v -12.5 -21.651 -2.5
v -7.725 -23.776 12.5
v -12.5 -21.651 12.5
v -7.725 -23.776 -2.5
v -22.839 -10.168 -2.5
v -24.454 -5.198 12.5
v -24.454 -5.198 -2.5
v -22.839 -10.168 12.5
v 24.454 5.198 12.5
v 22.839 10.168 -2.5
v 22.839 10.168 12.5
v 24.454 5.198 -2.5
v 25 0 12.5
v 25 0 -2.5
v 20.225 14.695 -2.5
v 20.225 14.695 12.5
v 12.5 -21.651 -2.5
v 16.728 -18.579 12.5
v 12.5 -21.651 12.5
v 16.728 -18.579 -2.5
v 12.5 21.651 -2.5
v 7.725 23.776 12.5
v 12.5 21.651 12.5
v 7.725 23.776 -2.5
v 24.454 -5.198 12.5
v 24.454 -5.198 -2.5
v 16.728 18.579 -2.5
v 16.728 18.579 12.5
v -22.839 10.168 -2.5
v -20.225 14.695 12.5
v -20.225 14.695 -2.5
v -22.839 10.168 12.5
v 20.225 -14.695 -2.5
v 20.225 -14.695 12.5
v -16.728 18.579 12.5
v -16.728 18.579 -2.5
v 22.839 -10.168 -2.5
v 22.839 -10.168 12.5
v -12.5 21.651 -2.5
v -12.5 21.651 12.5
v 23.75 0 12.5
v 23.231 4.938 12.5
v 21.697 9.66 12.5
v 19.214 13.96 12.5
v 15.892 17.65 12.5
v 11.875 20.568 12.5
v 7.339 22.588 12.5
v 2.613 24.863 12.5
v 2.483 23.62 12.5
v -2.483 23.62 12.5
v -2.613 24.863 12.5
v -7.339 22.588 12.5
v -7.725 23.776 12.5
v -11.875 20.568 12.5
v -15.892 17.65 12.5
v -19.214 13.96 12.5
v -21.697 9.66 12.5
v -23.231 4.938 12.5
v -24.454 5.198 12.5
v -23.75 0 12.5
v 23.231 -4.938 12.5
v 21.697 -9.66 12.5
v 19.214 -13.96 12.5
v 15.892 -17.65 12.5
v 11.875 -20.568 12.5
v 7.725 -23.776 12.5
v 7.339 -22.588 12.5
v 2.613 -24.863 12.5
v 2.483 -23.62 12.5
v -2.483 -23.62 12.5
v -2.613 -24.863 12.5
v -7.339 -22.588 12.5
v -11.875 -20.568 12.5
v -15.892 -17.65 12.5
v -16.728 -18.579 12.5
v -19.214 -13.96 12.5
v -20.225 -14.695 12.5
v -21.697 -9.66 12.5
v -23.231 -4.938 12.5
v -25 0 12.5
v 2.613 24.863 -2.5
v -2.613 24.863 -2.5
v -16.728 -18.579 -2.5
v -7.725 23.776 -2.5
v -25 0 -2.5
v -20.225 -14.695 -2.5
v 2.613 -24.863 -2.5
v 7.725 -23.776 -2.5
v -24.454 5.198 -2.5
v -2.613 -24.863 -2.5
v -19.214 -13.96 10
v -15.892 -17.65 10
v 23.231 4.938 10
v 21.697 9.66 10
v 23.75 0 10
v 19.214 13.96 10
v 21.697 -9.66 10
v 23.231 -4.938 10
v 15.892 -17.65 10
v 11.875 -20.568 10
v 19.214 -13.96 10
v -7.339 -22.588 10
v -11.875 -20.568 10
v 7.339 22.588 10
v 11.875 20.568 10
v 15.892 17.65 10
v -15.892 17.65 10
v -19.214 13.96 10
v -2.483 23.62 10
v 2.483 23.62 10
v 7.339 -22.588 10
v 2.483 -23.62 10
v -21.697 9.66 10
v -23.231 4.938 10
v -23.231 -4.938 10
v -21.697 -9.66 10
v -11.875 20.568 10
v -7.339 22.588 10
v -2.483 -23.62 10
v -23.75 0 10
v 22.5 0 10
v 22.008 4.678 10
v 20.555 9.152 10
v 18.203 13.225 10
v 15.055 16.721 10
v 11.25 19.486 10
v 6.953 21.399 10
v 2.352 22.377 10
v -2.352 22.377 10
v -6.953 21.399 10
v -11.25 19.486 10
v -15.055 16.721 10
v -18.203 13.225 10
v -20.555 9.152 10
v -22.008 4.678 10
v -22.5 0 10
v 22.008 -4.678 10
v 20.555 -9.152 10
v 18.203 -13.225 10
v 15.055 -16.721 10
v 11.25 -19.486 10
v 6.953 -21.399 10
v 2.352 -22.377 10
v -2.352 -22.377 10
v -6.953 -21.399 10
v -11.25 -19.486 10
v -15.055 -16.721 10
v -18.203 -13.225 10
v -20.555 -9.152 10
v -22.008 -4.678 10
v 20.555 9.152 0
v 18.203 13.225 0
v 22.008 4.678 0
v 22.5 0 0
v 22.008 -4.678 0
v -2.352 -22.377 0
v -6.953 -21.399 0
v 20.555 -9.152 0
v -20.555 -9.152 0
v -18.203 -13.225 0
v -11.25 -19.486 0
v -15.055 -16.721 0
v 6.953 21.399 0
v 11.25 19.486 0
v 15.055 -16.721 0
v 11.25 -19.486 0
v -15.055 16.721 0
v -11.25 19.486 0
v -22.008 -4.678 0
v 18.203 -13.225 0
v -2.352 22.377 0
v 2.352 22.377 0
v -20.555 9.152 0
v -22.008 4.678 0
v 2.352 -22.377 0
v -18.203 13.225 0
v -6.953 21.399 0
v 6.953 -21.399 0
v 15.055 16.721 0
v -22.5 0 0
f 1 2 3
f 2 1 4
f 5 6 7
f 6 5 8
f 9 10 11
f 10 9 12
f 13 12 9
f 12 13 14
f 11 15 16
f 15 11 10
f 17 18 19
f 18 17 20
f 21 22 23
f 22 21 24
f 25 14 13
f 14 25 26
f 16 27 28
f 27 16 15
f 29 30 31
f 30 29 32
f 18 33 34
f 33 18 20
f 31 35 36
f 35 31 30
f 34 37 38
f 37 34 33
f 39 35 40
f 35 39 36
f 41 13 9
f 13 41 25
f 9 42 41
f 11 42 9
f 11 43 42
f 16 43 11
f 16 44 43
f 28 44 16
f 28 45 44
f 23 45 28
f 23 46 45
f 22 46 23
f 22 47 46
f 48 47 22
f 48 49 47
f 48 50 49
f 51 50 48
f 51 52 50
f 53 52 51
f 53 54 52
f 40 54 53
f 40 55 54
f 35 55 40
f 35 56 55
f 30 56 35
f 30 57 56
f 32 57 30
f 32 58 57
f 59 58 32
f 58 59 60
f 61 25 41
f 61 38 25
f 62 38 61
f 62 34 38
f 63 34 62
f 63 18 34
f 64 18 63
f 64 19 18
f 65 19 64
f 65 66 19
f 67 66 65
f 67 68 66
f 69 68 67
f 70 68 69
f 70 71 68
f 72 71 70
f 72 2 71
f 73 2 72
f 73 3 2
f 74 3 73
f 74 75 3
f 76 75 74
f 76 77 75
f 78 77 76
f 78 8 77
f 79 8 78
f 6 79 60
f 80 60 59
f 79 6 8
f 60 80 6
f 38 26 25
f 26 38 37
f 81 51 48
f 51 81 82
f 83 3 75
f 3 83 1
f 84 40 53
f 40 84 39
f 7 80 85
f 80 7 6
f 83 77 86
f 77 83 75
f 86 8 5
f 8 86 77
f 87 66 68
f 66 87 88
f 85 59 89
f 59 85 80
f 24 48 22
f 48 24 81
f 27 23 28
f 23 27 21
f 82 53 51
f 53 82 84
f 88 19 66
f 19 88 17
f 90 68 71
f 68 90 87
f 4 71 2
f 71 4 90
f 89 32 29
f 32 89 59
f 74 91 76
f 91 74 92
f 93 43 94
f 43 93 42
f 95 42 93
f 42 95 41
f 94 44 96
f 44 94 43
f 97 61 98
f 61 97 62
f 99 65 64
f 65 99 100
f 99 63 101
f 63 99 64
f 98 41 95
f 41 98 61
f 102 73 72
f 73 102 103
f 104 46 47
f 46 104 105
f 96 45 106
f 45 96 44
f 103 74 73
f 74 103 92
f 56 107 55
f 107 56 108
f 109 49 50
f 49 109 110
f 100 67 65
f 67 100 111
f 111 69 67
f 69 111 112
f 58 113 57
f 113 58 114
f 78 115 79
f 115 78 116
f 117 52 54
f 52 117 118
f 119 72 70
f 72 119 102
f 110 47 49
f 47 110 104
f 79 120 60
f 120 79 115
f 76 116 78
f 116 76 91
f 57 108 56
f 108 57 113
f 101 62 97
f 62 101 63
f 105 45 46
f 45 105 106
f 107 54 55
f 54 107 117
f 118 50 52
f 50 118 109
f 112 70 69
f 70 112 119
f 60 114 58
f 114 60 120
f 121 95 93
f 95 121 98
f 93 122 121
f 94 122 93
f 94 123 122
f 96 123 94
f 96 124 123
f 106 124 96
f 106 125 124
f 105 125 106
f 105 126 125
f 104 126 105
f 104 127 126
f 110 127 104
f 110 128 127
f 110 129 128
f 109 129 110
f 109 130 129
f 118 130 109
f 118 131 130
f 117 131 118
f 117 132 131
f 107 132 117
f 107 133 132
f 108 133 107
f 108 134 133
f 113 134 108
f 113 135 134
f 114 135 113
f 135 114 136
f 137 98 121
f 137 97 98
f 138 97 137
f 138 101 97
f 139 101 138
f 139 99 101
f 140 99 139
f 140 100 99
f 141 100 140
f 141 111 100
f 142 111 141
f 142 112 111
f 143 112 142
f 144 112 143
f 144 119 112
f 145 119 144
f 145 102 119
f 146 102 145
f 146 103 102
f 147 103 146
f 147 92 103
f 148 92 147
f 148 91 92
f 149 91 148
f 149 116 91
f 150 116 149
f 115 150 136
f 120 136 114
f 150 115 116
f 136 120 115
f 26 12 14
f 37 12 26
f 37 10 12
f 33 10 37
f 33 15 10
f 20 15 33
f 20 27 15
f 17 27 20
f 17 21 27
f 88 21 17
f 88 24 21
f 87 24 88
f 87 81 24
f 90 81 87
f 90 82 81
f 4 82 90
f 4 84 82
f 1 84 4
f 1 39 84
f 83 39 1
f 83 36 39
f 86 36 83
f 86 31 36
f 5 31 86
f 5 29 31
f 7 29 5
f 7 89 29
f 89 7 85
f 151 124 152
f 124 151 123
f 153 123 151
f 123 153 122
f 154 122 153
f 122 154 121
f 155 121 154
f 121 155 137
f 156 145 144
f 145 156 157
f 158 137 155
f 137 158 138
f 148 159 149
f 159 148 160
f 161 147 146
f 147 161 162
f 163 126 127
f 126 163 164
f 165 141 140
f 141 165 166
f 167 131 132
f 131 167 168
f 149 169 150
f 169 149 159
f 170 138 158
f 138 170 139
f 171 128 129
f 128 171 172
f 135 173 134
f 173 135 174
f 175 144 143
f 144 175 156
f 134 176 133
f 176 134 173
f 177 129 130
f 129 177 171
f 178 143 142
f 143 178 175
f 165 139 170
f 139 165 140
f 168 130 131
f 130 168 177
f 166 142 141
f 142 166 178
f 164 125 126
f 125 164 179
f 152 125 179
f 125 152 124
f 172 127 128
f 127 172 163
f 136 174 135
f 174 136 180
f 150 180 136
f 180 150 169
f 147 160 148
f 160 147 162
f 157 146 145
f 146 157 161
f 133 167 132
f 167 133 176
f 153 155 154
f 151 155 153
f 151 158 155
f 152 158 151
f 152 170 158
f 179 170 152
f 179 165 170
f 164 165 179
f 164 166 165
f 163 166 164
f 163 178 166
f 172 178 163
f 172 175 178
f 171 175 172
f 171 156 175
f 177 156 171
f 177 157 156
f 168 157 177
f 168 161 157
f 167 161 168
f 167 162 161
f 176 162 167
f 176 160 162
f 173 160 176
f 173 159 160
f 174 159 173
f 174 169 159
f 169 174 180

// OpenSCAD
height_picture = 3; // [1:5]
  
Cylinder_radius= 50+0;

Cup_Radius=22.5;//in mm

Top_Minimum_Thickness=2.5;
Wall_Thickness=2.5;
Wall_Height=10;
Rc=Cup_Radius+Wall_Thickness;
Base_Incut=1.25;
Base_Thickness=2.5;
Base_Radius=Cup_Radius+Base_Incut;


// Load a 100x100 pixel image. (images will be automatically stretched to fit) Simple, high contrast images like logos work best.
image_file = "image-surface.dat"; // [image_surface:100x100] 
 
union (){

difference(){
cylinder(Wall_Height+Base_Thickness,Rc,Rc);
translate([0,0,-1])cylinder(Wall_Height+2+Base_Thickness,Base_Radius,Base_Radius);
}

difference(){
translate([0,0,-Top_Minimum_Thickness])cylinder(Wall_Height+Top_Minimum_Thickness,Rc,Rc);
translate([0,0,-1-Top_Minimum_Thickness])cylinder(Wall_Height+2+Top_Minimum_Thickness,Cup_Radius,Cup_Radius);
}

translate([0,0,0-Top_Minimum_Thickness])cylinder(Top_Minimum_Thickness,Rc,Rc);

scale([Cup_Radius/50,Cup_Radius/50,1]) intersection(){
translate([0,0,0-Top_Minimum_Thickness])cylinder(height_picture+Top_Minimum_Thickness+1,Cylinder_radius,Cylinder_radius);

scale([1,1,height_picture]) surface(file=image_file, center=true, convexity=5);
//};

}

}
